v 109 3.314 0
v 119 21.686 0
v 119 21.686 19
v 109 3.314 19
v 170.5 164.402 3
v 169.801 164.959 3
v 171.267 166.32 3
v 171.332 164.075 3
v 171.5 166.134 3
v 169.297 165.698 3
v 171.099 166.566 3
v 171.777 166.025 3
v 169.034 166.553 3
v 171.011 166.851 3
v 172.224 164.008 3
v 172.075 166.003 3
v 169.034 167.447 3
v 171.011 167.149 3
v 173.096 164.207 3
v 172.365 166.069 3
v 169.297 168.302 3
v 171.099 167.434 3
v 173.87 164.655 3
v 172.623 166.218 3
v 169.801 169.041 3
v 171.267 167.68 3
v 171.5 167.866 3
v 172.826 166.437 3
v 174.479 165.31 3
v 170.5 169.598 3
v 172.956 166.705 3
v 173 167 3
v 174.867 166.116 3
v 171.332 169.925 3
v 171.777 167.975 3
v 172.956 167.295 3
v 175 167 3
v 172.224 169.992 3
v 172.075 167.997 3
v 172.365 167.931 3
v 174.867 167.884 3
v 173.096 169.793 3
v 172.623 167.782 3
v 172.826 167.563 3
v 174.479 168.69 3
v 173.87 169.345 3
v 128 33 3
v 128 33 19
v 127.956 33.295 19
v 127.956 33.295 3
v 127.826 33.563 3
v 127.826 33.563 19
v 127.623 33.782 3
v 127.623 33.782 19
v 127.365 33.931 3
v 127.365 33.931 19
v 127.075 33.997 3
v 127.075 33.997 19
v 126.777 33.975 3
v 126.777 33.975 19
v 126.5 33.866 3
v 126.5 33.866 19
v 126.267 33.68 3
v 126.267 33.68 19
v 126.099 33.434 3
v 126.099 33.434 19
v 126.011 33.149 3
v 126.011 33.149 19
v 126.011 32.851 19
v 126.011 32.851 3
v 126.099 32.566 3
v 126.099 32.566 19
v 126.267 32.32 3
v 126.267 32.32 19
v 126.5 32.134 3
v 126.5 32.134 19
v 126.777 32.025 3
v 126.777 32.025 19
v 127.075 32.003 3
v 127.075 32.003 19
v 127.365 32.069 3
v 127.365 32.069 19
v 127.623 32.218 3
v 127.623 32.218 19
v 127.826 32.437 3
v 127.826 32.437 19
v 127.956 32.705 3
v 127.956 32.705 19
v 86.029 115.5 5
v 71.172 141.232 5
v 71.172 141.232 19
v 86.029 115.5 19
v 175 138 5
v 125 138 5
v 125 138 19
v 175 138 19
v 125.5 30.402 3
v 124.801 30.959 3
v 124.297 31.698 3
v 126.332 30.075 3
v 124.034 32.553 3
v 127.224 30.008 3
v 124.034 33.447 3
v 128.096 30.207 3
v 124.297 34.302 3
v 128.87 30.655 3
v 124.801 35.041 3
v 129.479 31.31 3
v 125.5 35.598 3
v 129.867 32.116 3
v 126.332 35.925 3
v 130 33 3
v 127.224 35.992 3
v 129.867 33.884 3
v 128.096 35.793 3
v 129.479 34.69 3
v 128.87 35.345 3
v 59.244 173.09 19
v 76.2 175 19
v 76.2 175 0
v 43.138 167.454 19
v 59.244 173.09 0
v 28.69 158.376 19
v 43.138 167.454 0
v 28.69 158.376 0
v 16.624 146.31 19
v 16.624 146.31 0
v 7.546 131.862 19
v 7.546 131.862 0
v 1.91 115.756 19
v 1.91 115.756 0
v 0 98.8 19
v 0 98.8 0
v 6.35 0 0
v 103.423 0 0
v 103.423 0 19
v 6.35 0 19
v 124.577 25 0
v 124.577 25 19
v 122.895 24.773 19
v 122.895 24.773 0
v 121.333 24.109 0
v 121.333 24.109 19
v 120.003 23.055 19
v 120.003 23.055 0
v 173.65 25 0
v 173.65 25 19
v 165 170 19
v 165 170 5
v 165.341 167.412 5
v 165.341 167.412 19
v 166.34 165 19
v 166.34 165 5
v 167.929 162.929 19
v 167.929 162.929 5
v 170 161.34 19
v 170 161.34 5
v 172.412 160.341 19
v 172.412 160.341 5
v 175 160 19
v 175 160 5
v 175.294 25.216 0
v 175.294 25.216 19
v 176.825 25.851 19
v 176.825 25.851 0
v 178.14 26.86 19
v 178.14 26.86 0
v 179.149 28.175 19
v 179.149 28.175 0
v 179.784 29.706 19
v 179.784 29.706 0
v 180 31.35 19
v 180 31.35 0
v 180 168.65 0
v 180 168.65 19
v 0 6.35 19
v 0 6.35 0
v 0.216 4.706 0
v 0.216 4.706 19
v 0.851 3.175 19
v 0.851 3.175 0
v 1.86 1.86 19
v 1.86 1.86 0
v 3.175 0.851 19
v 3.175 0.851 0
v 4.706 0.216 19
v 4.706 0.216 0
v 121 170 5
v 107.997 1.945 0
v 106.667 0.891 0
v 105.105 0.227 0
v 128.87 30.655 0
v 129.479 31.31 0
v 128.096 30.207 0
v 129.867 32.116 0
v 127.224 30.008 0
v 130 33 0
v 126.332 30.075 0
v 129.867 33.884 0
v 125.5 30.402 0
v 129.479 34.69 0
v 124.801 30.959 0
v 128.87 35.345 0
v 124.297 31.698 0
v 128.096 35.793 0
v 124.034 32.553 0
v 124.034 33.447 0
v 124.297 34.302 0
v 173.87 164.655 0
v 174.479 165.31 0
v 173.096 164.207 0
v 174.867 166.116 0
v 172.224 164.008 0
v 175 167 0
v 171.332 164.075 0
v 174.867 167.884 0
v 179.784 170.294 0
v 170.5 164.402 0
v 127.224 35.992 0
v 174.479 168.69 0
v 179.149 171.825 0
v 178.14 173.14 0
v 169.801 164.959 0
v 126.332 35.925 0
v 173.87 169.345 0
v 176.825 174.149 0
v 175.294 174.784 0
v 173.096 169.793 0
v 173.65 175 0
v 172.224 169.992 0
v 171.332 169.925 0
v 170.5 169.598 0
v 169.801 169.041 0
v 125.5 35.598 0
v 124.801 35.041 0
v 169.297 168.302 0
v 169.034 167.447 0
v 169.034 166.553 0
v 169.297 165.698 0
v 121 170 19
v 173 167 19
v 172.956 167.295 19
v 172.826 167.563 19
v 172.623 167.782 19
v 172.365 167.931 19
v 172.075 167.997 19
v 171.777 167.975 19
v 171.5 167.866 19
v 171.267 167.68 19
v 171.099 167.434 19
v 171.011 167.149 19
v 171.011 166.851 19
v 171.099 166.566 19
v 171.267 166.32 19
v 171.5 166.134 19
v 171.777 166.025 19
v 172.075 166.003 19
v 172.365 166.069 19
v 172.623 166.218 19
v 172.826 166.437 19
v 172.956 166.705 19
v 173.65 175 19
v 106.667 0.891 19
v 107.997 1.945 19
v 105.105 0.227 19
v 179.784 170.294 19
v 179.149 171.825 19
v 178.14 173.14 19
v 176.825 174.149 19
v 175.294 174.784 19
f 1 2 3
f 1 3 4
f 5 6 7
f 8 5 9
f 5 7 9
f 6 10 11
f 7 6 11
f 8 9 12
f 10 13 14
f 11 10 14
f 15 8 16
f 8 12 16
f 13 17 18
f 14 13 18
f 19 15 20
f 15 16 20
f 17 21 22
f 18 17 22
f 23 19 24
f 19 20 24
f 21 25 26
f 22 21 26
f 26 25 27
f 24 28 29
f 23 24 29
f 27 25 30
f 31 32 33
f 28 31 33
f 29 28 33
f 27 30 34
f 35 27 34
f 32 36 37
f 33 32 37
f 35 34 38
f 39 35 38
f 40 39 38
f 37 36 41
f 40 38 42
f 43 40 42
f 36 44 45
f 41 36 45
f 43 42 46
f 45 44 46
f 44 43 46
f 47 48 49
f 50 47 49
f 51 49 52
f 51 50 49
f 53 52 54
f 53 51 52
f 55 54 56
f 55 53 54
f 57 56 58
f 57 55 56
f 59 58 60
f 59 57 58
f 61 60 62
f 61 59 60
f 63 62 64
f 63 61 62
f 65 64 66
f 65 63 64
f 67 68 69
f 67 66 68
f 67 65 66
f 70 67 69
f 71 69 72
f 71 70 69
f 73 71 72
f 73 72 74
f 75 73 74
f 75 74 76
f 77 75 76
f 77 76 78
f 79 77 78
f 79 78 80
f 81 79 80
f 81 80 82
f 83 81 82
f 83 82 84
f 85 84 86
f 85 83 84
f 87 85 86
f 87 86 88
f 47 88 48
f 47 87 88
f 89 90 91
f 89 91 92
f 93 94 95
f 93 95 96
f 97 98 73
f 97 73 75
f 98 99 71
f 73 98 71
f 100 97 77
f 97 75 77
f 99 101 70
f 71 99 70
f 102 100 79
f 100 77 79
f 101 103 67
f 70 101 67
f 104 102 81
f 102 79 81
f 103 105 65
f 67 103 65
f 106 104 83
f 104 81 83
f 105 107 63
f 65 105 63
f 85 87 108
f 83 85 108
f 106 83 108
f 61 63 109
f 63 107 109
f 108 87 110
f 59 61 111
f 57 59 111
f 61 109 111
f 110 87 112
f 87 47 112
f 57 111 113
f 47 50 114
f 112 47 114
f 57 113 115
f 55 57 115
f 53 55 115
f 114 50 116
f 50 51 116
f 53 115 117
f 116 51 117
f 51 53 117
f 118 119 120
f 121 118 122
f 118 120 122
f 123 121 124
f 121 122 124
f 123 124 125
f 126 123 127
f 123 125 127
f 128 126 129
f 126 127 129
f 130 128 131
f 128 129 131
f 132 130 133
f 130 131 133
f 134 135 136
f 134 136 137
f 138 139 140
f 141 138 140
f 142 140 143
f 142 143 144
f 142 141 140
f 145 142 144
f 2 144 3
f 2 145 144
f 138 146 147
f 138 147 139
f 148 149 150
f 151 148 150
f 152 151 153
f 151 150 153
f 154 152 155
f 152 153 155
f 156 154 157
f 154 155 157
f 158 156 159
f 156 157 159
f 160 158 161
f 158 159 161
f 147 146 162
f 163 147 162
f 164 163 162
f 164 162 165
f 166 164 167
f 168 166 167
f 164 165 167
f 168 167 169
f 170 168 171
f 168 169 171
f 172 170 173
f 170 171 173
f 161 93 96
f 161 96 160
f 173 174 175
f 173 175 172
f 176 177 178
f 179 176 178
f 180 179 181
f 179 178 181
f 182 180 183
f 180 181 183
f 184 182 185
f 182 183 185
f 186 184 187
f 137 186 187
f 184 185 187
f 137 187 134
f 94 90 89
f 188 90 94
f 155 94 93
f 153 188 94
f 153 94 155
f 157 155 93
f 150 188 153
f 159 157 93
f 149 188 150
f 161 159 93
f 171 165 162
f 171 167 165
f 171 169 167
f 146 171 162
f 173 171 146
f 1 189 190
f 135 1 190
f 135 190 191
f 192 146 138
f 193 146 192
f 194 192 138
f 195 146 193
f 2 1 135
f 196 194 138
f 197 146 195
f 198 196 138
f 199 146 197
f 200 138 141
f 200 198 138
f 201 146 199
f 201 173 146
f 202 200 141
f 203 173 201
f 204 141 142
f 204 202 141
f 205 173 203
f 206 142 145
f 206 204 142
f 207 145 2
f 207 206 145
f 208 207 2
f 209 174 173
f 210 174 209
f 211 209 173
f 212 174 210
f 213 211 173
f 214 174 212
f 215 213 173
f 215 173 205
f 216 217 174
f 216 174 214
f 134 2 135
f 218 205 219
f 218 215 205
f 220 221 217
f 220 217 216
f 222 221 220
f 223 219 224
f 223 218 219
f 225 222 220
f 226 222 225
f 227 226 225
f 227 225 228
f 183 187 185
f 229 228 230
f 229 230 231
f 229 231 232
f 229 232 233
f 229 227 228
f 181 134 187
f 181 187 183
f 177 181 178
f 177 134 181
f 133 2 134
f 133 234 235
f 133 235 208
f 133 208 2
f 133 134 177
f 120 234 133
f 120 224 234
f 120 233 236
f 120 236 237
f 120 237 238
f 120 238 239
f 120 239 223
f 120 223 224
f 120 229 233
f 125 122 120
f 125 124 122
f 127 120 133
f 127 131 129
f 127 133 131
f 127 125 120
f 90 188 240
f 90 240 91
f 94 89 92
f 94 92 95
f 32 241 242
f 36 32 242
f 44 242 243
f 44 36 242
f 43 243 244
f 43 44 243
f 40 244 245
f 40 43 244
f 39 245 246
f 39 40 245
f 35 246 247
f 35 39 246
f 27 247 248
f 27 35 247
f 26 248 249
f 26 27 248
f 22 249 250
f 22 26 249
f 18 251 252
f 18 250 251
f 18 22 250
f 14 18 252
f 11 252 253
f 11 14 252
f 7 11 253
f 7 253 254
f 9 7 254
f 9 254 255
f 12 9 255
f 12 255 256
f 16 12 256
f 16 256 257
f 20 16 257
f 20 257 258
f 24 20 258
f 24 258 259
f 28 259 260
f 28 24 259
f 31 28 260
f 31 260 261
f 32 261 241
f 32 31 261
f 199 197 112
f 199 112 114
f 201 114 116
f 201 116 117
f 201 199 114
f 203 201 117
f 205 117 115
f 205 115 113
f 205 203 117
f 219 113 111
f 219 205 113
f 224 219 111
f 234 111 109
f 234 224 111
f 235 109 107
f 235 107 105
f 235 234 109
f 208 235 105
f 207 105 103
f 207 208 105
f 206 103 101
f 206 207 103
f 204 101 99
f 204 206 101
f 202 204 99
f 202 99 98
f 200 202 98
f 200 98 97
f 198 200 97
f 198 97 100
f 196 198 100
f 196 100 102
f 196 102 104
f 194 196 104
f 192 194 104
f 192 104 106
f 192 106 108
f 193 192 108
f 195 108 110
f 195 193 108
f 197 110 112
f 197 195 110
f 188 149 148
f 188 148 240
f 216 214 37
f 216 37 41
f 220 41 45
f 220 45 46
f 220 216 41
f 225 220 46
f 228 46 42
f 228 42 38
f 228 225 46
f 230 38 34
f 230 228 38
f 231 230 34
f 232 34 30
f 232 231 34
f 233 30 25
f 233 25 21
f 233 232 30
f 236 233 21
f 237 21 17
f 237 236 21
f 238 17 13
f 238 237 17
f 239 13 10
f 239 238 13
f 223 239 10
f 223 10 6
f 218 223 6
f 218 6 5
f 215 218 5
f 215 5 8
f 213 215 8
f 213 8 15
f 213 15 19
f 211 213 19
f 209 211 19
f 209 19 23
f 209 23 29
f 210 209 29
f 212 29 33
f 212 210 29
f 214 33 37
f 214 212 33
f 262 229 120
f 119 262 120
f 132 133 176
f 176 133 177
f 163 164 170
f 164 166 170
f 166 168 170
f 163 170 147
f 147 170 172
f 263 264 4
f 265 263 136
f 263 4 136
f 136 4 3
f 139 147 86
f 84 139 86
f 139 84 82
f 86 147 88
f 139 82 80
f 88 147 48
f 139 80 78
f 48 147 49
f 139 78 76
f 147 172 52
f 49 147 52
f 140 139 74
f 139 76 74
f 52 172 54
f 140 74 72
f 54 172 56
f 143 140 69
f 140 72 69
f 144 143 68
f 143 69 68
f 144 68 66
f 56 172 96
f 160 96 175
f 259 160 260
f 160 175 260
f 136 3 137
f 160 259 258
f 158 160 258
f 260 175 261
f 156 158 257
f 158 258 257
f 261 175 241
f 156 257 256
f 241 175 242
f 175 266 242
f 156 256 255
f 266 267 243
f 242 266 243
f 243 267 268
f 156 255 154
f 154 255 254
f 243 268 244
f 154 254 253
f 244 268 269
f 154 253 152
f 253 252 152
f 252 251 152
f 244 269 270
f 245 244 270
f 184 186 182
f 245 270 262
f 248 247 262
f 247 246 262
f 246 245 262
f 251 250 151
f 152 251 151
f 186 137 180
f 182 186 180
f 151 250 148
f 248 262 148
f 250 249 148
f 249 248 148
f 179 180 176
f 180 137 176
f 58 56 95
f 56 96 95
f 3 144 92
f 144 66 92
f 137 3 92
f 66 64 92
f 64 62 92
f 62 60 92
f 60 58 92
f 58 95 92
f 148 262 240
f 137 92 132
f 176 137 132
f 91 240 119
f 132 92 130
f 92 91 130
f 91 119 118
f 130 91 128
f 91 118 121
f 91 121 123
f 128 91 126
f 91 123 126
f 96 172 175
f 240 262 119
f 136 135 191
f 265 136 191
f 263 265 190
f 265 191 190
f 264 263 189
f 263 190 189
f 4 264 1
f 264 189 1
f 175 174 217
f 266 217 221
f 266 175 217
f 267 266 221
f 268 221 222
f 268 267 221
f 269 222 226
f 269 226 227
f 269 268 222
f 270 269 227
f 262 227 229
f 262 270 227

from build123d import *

# Parameters (mm, degrees)
PAD_DEPTH            = 19
FILLET001_R          = 6.35
POCKET002_DEPTH      = 14.001
SKETCH014_R          = 1
POCKET005_DEPTH      = 0.001
POCKET005_DEPTH_BACK = 19.001
SKETCH015_R          = 3
POCKET006_DEPTH      = 3


with BuildPart() as part:
    # Sketch001 → Pad (new body)
    with BuildSketch(Plane.XY):
        with BuildLine():
            Line((180, 175), (180, 31.35))
            ThreePointArc((173.65, 25), (178.140128, 26.859872), (180, 31.35))
            Line((173.65, 25), (124.577301, 25))
            ThreePointArc((124.577301, 25), (121.333458, 24.108936), (119, 21.685821))
            Line((119, 21.685821), (109, 3.314179))
            ThreePointArc((103.422699, 0), (106.666542, 0.891064), (109, 3.314179))
            Line((103.422699, 0), (6.35, 0))
            ThreePointArc((0, 6.35), (1.859872, 1.859872), (6.35, 0))
            Line((0, 98.8), (0, 6.35))
            ThreePointArc((76.2, 175), (22.318463, 152.681537), (0, 98.8))
            Line((180, 175), (76.2, 175))
        make_face()
    extrude(amount=PAD_DEPTH)

    # Fillet001
    fillet001_edges = [part.edges().sort_by_distance(p)[0] for p in [
        (180, 175, 9.5),
    ]]
    fillet(fillet001_edges, radius=FILLET001_R)

    # Sketch007 → Pocket002 (cut, through all)
    with BuildSketch(Plane.XY.offset(5)):
        with BuildLine():
            Line((165, 170), (121, 170))
            Line((121, 170), (71.17245, 141.232051))
            Line((71.17245, 141.232051), (86.028857, 115.5))
            Line((86.028857, 115.5), (125, 138))
            Line((125, 138), (175, 138))
            Line((175, 138), (175, 160))
            ThreePointArc((165, 170), (167.928932, 162.928932), (175, 160))
        make_face()
    extrude(amount=POCKET002_DEPTH, mode=Mode.SUBTRACT)

    # Sketch014 → Pocket005 (cut, two sides)
    with BuildSketch(Plane.XY) as pocket005_sk:
        with Locations((172, 167)):
            Circle(SKETCH014_R)
        with Locations((127, 33)):
            Circle(SKETCH014_R)
    extrude(amount=-POCKET005_DEPTH, mode=Mode.SUBTRACT)
    extrude(pocket005_sk.sketch, amount=POCKET005_DEPTH_BACK, mode=Mode.SUBTRACT)

    # Sketch015 → Pocket006 (cut)
    with BuildSketch(Plane.XY):
        with Locations((127, 33)):
            Circle(SKETCH015_R)
        with Locations((172, 167)):
            Circle(SKETCH015_R)
    extrude(amount=POCKET006_DEPTH, mode=Mode.SUBTRACT)


solid = part.part
